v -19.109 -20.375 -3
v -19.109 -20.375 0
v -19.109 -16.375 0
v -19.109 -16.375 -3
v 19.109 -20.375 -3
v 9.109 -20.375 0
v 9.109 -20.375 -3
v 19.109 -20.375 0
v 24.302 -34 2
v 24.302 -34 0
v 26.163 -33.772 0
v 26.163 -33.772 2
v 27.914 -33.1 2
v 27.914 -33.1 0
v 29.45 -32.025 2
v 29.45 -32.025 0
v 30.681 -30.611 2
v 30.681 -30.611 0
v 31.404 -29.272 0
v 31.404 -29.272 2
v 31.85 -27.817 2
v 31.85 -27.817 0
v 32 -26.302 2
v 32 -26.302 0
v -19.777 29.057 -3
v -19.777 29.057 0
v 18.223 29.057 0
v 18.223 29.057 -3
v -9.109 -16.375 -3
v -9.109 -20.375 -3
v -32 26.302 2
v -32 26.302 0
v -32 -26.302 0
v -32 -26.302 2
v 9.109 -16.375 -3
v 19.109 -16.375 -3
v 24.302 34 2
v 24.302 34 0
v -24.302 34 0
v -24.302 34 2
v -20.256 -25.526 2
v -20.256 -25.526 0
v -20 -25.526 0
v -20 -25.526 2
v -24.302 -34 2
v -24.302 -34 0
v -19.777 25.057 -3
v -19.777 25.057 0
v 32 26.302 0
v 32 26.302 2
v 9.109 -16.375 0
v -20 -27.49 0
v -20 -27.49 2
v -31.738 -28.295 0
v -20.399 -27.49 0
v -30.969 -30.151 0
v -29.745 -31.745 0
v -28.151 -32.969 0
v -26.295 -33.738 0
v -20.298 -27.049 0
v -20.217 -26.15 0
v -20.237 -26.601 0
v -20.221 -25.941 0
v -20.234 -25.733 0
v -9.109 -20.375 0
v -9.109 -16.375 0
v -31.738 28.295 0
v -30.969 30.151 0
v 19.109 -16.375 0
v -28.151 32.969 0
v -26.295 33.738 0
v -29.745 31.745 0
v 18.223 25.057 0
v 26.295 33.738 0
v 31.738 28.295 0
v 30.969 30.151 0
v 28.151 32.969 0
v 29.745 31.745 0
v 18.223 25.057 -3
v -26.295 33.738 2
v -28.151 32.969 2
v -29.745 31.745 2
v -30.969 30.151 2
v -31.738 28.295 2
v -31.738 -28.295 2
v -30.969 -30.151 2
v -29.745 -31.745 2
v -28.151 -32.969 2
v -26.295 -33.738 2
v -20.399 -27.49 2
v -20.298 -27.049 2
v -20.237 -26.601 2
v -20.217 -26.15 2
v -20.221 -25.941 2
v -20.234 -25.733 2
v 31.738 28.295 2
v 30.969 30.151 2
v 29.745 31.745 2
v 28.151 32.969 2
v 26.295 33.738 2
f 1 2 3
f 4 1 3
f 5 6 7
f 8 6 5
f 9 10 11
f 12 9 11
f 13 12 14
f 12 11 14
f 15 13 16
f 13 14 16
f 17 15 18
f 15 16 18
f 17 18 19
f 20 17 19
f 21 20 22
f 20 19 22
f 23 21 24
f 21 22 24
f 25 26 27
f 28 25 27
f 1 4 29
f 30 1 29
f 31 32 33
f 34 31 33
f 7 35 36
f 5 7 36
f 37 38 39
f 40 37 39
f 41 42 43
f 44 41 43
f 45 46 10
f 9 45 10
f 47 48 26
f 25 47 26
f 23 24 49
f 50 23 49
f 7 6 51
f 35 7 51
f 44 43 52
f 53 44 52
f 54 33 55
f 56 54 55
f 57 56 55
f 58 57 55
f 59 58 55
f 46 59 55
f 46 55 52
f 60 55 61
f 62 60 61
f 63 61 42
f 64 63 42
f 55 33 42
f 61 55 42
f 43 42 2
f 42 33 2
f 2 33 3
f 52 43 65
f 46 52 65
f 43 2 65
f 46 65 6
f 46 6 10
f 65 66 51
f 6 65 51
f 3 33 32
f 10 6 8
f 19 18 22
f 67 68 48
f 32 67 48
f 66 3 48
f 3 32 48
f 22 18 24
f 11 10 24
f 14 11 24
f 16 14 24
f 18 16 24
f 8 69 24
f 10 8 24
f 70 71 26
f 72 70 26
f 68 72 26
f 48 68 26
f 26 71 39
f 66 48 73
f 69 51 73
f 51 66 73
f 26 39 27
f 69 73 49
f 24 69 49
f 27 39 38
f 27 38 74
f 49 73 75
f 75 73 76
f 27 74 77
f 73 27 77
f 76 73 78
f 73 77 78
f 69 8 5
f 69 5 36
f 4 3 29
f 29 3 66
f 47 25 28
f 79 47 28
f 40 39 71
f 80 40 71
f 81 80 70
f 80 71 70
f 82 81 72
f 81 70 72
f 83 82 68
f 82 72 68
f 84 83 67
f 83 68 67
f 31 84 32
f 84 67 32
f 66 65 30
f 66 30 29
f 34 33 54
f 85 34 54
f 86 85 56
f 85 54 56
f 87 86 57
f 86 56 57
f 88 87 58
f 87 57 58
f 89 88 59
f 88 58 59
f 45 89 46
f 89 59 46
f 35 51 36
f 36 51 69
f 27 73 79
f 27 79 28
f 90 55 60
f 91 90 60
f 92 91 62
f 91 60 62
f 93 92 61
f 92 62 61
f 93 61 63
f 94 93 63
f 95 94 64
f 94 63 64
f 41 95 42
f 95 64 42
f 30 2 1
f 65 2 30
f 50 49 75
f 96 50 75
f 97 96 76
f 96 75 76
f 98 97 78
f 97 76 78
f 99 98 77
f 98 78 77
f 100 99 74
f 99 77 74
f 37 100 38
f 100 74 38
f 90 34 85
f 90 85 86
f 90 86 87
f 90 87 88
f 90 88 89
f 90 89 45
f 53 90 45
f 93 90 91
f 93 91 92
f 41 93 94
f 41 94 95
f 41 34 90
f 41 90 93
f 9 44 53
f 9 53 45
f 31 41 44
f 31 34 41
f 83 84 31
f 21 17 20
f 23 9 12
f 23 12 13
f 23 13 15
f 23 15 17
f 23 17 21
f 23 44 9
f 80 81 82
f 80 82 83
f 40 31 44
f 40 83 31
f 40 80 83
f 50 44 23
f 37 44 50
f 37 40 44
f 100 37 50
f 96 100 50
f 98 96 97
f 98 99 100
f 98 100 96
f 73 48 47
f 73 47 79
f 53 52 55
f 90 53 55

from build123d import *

# Parameters (mm, degrees)
F1_DEPTH = 2
F2_DEPTH = 2
F4_W     = 38
F4_H     = 4
F4_W_2   = 10
F5_DEPTH = 3


# Not quite as in the source:
# - a feature names something its author has since deleted; it is built from what else it names


with BuildPart() as f1:
    # F0 (on Top) → F1 (new body)
    with BuildSketch(Plane.XY):
        with BuildLine():
            Line((24.3022678875, 34), (-24.3022678875, 34))
            ThreePointArc((-24.3022678875, 34), (-29.745386464, 31.745386464), (-32, 26.3022678875))
            Line((-32, 26.3022678875), (-32, 15.1276998222))
            Line((-32, 15.1276998222), (-30.5, 15.1276998222))
            Line((-30.5, 15.1276998222), (-30.5, 21.3020170704))
            Line((-30.5, 21.3020170704), (30.5, 21.3020170704))
            Line((30.5, 21.3020170704), (30.5, 14.2477769405))
            Line((30.5, 14.2477769405), (32, 14.2477769405))
            Line((32, 14.2477769405), (32, 26.3022678875))
            ThreePointArc((32, 26.3022678875), (29.745386464, 31.745386464), (24.3022678875, 34))
        make_face()
        with BuildLine():
            Line((-30.5, 15.1276998222), (-32, 15.1276998222))
            Line((-32, 15.1276998222), (-32, -26.3022678875))
            ThreePointArc((-32, -26.3022678875), (-29.745386464, -31.745386464), (-24.3022678875, -34))
            Line((-24.3022678875, -34), (0, -34))
            Line((0, -34), (24.3022678875, -34))
            ThreePointArc((24.3022678875, -34), (27.9138443036, -33.100178998), (30.6810753302, -30.6110838832))
            ThreePointArc((30.6810753302, -30.6110838832), (31.6628871063, -28.555346757), (32, -26.3022678875))
            Line((32, -26.3022678875), (32, 14.2477769405))
            Line((32, 14.2477769405), (30.5, 14.2477769405))
            Line((30.5, 14.2477769405), (30.5, -14.6979829296))
            Line((30.5, -14.6979829296), (-30.5, -14.6979829296))
            Line((-30.5, -14.6979829296), (-30.5, 15.1276998222))
        make_face()
        with BuildLine():
            ThreePointArc((-20.3994758379, -27.4899639189), (-30.2031719041, -25.7844938681), (-20.255592559, -25.5261339915))
            Line((-20.255592559, -25.5261339915), (-20, -25.5261339915))
            Line((-20, -25.5261339915), (-20, -27.4899639189))
            Line((-20, -27.4899639189), (-20.3994758379, -27.4899639189))
        make_face(mode=Mode.SUBTRACT)
        with BuildLine():
            ThreePointArc((20.2726339823, -25.4029799253), (25.5910239568, -21.1638916046), (30.2165381279, -26.1498479185))
            ThreePointArc((30.2165381279, -26.1498479185), (25.7296627026, -31.1234485429), (20.3218568596, -27.1706786007))
            ThreePointArc((20.3218568596, -27.1706786007), (20.2184754644, -26.2890226707), (20.2726339823, -25.4029799253))
        make_face(mode=Mode.SUBTRACT)
        Polygon((-30.5, 21.3020170704), (-30.5, 15.1276998222), (-30.5, -14.6979829296), (30.5, -14.6979829296), (30.5, 14.2477769405), (30.5, 21.3020170704), align=None)
    extrude(amount=F1_DEPTH)

    # F0 (on Top) → F2 (join)
    with BuildSketch(Plane.XY):
        with BuildLine():
            ThreePointArc((-20.3994758379, -27.4899639189), (-20.2624836545, -26.8261202565), (-20.2165381279, -26.1498479185))
            ThreePointArc((-20.2165381279, -26.1498479185), (-20.2263112871, -25.8373801956), (-20.255592559, -25.5261339915))
            ThreePointArc((-20.255592559, -25.5261339915), (-30.2031719041, -25.7844938681), (-20.3994758379, -27.4899639189))
        make_face()
        with BuildLine():
            ThreePointArc((20.3218568596, -27.1706786007), (25.7296627026, -31.1234485429), (30.2165381279, -26.1498479185))
            ThreePointArc((30.2165381279, -26.1498479185), (25.5910239568, -21.1638916046), (20.2726339823, -25.4029799253))
            ThreePointArc((20.2726339823, -25.4029799253), (20.2184754644, -26.2890226707), (20.3218568596, -27.1706786007))
        make_face()
    extrude(amount=F2_DEPTH)

    # F4 (on face) → F5 (join)
    with BuildSketch(Plane.XY):
        with Locations((-0.7767596692, 27.0571730584)):
            Rectangle(F4_W, F4_H)
        with Locations((14.1091264039, -18.375430584)):
            Rectangle(F4_W_2, F4_H)
        with Locations((-14.1091264039, -18.375430584)):
            Rectangle(F4_W_2, F4_H)
    extrude(amount=-F5_DEPTH)


solid = f1.part
